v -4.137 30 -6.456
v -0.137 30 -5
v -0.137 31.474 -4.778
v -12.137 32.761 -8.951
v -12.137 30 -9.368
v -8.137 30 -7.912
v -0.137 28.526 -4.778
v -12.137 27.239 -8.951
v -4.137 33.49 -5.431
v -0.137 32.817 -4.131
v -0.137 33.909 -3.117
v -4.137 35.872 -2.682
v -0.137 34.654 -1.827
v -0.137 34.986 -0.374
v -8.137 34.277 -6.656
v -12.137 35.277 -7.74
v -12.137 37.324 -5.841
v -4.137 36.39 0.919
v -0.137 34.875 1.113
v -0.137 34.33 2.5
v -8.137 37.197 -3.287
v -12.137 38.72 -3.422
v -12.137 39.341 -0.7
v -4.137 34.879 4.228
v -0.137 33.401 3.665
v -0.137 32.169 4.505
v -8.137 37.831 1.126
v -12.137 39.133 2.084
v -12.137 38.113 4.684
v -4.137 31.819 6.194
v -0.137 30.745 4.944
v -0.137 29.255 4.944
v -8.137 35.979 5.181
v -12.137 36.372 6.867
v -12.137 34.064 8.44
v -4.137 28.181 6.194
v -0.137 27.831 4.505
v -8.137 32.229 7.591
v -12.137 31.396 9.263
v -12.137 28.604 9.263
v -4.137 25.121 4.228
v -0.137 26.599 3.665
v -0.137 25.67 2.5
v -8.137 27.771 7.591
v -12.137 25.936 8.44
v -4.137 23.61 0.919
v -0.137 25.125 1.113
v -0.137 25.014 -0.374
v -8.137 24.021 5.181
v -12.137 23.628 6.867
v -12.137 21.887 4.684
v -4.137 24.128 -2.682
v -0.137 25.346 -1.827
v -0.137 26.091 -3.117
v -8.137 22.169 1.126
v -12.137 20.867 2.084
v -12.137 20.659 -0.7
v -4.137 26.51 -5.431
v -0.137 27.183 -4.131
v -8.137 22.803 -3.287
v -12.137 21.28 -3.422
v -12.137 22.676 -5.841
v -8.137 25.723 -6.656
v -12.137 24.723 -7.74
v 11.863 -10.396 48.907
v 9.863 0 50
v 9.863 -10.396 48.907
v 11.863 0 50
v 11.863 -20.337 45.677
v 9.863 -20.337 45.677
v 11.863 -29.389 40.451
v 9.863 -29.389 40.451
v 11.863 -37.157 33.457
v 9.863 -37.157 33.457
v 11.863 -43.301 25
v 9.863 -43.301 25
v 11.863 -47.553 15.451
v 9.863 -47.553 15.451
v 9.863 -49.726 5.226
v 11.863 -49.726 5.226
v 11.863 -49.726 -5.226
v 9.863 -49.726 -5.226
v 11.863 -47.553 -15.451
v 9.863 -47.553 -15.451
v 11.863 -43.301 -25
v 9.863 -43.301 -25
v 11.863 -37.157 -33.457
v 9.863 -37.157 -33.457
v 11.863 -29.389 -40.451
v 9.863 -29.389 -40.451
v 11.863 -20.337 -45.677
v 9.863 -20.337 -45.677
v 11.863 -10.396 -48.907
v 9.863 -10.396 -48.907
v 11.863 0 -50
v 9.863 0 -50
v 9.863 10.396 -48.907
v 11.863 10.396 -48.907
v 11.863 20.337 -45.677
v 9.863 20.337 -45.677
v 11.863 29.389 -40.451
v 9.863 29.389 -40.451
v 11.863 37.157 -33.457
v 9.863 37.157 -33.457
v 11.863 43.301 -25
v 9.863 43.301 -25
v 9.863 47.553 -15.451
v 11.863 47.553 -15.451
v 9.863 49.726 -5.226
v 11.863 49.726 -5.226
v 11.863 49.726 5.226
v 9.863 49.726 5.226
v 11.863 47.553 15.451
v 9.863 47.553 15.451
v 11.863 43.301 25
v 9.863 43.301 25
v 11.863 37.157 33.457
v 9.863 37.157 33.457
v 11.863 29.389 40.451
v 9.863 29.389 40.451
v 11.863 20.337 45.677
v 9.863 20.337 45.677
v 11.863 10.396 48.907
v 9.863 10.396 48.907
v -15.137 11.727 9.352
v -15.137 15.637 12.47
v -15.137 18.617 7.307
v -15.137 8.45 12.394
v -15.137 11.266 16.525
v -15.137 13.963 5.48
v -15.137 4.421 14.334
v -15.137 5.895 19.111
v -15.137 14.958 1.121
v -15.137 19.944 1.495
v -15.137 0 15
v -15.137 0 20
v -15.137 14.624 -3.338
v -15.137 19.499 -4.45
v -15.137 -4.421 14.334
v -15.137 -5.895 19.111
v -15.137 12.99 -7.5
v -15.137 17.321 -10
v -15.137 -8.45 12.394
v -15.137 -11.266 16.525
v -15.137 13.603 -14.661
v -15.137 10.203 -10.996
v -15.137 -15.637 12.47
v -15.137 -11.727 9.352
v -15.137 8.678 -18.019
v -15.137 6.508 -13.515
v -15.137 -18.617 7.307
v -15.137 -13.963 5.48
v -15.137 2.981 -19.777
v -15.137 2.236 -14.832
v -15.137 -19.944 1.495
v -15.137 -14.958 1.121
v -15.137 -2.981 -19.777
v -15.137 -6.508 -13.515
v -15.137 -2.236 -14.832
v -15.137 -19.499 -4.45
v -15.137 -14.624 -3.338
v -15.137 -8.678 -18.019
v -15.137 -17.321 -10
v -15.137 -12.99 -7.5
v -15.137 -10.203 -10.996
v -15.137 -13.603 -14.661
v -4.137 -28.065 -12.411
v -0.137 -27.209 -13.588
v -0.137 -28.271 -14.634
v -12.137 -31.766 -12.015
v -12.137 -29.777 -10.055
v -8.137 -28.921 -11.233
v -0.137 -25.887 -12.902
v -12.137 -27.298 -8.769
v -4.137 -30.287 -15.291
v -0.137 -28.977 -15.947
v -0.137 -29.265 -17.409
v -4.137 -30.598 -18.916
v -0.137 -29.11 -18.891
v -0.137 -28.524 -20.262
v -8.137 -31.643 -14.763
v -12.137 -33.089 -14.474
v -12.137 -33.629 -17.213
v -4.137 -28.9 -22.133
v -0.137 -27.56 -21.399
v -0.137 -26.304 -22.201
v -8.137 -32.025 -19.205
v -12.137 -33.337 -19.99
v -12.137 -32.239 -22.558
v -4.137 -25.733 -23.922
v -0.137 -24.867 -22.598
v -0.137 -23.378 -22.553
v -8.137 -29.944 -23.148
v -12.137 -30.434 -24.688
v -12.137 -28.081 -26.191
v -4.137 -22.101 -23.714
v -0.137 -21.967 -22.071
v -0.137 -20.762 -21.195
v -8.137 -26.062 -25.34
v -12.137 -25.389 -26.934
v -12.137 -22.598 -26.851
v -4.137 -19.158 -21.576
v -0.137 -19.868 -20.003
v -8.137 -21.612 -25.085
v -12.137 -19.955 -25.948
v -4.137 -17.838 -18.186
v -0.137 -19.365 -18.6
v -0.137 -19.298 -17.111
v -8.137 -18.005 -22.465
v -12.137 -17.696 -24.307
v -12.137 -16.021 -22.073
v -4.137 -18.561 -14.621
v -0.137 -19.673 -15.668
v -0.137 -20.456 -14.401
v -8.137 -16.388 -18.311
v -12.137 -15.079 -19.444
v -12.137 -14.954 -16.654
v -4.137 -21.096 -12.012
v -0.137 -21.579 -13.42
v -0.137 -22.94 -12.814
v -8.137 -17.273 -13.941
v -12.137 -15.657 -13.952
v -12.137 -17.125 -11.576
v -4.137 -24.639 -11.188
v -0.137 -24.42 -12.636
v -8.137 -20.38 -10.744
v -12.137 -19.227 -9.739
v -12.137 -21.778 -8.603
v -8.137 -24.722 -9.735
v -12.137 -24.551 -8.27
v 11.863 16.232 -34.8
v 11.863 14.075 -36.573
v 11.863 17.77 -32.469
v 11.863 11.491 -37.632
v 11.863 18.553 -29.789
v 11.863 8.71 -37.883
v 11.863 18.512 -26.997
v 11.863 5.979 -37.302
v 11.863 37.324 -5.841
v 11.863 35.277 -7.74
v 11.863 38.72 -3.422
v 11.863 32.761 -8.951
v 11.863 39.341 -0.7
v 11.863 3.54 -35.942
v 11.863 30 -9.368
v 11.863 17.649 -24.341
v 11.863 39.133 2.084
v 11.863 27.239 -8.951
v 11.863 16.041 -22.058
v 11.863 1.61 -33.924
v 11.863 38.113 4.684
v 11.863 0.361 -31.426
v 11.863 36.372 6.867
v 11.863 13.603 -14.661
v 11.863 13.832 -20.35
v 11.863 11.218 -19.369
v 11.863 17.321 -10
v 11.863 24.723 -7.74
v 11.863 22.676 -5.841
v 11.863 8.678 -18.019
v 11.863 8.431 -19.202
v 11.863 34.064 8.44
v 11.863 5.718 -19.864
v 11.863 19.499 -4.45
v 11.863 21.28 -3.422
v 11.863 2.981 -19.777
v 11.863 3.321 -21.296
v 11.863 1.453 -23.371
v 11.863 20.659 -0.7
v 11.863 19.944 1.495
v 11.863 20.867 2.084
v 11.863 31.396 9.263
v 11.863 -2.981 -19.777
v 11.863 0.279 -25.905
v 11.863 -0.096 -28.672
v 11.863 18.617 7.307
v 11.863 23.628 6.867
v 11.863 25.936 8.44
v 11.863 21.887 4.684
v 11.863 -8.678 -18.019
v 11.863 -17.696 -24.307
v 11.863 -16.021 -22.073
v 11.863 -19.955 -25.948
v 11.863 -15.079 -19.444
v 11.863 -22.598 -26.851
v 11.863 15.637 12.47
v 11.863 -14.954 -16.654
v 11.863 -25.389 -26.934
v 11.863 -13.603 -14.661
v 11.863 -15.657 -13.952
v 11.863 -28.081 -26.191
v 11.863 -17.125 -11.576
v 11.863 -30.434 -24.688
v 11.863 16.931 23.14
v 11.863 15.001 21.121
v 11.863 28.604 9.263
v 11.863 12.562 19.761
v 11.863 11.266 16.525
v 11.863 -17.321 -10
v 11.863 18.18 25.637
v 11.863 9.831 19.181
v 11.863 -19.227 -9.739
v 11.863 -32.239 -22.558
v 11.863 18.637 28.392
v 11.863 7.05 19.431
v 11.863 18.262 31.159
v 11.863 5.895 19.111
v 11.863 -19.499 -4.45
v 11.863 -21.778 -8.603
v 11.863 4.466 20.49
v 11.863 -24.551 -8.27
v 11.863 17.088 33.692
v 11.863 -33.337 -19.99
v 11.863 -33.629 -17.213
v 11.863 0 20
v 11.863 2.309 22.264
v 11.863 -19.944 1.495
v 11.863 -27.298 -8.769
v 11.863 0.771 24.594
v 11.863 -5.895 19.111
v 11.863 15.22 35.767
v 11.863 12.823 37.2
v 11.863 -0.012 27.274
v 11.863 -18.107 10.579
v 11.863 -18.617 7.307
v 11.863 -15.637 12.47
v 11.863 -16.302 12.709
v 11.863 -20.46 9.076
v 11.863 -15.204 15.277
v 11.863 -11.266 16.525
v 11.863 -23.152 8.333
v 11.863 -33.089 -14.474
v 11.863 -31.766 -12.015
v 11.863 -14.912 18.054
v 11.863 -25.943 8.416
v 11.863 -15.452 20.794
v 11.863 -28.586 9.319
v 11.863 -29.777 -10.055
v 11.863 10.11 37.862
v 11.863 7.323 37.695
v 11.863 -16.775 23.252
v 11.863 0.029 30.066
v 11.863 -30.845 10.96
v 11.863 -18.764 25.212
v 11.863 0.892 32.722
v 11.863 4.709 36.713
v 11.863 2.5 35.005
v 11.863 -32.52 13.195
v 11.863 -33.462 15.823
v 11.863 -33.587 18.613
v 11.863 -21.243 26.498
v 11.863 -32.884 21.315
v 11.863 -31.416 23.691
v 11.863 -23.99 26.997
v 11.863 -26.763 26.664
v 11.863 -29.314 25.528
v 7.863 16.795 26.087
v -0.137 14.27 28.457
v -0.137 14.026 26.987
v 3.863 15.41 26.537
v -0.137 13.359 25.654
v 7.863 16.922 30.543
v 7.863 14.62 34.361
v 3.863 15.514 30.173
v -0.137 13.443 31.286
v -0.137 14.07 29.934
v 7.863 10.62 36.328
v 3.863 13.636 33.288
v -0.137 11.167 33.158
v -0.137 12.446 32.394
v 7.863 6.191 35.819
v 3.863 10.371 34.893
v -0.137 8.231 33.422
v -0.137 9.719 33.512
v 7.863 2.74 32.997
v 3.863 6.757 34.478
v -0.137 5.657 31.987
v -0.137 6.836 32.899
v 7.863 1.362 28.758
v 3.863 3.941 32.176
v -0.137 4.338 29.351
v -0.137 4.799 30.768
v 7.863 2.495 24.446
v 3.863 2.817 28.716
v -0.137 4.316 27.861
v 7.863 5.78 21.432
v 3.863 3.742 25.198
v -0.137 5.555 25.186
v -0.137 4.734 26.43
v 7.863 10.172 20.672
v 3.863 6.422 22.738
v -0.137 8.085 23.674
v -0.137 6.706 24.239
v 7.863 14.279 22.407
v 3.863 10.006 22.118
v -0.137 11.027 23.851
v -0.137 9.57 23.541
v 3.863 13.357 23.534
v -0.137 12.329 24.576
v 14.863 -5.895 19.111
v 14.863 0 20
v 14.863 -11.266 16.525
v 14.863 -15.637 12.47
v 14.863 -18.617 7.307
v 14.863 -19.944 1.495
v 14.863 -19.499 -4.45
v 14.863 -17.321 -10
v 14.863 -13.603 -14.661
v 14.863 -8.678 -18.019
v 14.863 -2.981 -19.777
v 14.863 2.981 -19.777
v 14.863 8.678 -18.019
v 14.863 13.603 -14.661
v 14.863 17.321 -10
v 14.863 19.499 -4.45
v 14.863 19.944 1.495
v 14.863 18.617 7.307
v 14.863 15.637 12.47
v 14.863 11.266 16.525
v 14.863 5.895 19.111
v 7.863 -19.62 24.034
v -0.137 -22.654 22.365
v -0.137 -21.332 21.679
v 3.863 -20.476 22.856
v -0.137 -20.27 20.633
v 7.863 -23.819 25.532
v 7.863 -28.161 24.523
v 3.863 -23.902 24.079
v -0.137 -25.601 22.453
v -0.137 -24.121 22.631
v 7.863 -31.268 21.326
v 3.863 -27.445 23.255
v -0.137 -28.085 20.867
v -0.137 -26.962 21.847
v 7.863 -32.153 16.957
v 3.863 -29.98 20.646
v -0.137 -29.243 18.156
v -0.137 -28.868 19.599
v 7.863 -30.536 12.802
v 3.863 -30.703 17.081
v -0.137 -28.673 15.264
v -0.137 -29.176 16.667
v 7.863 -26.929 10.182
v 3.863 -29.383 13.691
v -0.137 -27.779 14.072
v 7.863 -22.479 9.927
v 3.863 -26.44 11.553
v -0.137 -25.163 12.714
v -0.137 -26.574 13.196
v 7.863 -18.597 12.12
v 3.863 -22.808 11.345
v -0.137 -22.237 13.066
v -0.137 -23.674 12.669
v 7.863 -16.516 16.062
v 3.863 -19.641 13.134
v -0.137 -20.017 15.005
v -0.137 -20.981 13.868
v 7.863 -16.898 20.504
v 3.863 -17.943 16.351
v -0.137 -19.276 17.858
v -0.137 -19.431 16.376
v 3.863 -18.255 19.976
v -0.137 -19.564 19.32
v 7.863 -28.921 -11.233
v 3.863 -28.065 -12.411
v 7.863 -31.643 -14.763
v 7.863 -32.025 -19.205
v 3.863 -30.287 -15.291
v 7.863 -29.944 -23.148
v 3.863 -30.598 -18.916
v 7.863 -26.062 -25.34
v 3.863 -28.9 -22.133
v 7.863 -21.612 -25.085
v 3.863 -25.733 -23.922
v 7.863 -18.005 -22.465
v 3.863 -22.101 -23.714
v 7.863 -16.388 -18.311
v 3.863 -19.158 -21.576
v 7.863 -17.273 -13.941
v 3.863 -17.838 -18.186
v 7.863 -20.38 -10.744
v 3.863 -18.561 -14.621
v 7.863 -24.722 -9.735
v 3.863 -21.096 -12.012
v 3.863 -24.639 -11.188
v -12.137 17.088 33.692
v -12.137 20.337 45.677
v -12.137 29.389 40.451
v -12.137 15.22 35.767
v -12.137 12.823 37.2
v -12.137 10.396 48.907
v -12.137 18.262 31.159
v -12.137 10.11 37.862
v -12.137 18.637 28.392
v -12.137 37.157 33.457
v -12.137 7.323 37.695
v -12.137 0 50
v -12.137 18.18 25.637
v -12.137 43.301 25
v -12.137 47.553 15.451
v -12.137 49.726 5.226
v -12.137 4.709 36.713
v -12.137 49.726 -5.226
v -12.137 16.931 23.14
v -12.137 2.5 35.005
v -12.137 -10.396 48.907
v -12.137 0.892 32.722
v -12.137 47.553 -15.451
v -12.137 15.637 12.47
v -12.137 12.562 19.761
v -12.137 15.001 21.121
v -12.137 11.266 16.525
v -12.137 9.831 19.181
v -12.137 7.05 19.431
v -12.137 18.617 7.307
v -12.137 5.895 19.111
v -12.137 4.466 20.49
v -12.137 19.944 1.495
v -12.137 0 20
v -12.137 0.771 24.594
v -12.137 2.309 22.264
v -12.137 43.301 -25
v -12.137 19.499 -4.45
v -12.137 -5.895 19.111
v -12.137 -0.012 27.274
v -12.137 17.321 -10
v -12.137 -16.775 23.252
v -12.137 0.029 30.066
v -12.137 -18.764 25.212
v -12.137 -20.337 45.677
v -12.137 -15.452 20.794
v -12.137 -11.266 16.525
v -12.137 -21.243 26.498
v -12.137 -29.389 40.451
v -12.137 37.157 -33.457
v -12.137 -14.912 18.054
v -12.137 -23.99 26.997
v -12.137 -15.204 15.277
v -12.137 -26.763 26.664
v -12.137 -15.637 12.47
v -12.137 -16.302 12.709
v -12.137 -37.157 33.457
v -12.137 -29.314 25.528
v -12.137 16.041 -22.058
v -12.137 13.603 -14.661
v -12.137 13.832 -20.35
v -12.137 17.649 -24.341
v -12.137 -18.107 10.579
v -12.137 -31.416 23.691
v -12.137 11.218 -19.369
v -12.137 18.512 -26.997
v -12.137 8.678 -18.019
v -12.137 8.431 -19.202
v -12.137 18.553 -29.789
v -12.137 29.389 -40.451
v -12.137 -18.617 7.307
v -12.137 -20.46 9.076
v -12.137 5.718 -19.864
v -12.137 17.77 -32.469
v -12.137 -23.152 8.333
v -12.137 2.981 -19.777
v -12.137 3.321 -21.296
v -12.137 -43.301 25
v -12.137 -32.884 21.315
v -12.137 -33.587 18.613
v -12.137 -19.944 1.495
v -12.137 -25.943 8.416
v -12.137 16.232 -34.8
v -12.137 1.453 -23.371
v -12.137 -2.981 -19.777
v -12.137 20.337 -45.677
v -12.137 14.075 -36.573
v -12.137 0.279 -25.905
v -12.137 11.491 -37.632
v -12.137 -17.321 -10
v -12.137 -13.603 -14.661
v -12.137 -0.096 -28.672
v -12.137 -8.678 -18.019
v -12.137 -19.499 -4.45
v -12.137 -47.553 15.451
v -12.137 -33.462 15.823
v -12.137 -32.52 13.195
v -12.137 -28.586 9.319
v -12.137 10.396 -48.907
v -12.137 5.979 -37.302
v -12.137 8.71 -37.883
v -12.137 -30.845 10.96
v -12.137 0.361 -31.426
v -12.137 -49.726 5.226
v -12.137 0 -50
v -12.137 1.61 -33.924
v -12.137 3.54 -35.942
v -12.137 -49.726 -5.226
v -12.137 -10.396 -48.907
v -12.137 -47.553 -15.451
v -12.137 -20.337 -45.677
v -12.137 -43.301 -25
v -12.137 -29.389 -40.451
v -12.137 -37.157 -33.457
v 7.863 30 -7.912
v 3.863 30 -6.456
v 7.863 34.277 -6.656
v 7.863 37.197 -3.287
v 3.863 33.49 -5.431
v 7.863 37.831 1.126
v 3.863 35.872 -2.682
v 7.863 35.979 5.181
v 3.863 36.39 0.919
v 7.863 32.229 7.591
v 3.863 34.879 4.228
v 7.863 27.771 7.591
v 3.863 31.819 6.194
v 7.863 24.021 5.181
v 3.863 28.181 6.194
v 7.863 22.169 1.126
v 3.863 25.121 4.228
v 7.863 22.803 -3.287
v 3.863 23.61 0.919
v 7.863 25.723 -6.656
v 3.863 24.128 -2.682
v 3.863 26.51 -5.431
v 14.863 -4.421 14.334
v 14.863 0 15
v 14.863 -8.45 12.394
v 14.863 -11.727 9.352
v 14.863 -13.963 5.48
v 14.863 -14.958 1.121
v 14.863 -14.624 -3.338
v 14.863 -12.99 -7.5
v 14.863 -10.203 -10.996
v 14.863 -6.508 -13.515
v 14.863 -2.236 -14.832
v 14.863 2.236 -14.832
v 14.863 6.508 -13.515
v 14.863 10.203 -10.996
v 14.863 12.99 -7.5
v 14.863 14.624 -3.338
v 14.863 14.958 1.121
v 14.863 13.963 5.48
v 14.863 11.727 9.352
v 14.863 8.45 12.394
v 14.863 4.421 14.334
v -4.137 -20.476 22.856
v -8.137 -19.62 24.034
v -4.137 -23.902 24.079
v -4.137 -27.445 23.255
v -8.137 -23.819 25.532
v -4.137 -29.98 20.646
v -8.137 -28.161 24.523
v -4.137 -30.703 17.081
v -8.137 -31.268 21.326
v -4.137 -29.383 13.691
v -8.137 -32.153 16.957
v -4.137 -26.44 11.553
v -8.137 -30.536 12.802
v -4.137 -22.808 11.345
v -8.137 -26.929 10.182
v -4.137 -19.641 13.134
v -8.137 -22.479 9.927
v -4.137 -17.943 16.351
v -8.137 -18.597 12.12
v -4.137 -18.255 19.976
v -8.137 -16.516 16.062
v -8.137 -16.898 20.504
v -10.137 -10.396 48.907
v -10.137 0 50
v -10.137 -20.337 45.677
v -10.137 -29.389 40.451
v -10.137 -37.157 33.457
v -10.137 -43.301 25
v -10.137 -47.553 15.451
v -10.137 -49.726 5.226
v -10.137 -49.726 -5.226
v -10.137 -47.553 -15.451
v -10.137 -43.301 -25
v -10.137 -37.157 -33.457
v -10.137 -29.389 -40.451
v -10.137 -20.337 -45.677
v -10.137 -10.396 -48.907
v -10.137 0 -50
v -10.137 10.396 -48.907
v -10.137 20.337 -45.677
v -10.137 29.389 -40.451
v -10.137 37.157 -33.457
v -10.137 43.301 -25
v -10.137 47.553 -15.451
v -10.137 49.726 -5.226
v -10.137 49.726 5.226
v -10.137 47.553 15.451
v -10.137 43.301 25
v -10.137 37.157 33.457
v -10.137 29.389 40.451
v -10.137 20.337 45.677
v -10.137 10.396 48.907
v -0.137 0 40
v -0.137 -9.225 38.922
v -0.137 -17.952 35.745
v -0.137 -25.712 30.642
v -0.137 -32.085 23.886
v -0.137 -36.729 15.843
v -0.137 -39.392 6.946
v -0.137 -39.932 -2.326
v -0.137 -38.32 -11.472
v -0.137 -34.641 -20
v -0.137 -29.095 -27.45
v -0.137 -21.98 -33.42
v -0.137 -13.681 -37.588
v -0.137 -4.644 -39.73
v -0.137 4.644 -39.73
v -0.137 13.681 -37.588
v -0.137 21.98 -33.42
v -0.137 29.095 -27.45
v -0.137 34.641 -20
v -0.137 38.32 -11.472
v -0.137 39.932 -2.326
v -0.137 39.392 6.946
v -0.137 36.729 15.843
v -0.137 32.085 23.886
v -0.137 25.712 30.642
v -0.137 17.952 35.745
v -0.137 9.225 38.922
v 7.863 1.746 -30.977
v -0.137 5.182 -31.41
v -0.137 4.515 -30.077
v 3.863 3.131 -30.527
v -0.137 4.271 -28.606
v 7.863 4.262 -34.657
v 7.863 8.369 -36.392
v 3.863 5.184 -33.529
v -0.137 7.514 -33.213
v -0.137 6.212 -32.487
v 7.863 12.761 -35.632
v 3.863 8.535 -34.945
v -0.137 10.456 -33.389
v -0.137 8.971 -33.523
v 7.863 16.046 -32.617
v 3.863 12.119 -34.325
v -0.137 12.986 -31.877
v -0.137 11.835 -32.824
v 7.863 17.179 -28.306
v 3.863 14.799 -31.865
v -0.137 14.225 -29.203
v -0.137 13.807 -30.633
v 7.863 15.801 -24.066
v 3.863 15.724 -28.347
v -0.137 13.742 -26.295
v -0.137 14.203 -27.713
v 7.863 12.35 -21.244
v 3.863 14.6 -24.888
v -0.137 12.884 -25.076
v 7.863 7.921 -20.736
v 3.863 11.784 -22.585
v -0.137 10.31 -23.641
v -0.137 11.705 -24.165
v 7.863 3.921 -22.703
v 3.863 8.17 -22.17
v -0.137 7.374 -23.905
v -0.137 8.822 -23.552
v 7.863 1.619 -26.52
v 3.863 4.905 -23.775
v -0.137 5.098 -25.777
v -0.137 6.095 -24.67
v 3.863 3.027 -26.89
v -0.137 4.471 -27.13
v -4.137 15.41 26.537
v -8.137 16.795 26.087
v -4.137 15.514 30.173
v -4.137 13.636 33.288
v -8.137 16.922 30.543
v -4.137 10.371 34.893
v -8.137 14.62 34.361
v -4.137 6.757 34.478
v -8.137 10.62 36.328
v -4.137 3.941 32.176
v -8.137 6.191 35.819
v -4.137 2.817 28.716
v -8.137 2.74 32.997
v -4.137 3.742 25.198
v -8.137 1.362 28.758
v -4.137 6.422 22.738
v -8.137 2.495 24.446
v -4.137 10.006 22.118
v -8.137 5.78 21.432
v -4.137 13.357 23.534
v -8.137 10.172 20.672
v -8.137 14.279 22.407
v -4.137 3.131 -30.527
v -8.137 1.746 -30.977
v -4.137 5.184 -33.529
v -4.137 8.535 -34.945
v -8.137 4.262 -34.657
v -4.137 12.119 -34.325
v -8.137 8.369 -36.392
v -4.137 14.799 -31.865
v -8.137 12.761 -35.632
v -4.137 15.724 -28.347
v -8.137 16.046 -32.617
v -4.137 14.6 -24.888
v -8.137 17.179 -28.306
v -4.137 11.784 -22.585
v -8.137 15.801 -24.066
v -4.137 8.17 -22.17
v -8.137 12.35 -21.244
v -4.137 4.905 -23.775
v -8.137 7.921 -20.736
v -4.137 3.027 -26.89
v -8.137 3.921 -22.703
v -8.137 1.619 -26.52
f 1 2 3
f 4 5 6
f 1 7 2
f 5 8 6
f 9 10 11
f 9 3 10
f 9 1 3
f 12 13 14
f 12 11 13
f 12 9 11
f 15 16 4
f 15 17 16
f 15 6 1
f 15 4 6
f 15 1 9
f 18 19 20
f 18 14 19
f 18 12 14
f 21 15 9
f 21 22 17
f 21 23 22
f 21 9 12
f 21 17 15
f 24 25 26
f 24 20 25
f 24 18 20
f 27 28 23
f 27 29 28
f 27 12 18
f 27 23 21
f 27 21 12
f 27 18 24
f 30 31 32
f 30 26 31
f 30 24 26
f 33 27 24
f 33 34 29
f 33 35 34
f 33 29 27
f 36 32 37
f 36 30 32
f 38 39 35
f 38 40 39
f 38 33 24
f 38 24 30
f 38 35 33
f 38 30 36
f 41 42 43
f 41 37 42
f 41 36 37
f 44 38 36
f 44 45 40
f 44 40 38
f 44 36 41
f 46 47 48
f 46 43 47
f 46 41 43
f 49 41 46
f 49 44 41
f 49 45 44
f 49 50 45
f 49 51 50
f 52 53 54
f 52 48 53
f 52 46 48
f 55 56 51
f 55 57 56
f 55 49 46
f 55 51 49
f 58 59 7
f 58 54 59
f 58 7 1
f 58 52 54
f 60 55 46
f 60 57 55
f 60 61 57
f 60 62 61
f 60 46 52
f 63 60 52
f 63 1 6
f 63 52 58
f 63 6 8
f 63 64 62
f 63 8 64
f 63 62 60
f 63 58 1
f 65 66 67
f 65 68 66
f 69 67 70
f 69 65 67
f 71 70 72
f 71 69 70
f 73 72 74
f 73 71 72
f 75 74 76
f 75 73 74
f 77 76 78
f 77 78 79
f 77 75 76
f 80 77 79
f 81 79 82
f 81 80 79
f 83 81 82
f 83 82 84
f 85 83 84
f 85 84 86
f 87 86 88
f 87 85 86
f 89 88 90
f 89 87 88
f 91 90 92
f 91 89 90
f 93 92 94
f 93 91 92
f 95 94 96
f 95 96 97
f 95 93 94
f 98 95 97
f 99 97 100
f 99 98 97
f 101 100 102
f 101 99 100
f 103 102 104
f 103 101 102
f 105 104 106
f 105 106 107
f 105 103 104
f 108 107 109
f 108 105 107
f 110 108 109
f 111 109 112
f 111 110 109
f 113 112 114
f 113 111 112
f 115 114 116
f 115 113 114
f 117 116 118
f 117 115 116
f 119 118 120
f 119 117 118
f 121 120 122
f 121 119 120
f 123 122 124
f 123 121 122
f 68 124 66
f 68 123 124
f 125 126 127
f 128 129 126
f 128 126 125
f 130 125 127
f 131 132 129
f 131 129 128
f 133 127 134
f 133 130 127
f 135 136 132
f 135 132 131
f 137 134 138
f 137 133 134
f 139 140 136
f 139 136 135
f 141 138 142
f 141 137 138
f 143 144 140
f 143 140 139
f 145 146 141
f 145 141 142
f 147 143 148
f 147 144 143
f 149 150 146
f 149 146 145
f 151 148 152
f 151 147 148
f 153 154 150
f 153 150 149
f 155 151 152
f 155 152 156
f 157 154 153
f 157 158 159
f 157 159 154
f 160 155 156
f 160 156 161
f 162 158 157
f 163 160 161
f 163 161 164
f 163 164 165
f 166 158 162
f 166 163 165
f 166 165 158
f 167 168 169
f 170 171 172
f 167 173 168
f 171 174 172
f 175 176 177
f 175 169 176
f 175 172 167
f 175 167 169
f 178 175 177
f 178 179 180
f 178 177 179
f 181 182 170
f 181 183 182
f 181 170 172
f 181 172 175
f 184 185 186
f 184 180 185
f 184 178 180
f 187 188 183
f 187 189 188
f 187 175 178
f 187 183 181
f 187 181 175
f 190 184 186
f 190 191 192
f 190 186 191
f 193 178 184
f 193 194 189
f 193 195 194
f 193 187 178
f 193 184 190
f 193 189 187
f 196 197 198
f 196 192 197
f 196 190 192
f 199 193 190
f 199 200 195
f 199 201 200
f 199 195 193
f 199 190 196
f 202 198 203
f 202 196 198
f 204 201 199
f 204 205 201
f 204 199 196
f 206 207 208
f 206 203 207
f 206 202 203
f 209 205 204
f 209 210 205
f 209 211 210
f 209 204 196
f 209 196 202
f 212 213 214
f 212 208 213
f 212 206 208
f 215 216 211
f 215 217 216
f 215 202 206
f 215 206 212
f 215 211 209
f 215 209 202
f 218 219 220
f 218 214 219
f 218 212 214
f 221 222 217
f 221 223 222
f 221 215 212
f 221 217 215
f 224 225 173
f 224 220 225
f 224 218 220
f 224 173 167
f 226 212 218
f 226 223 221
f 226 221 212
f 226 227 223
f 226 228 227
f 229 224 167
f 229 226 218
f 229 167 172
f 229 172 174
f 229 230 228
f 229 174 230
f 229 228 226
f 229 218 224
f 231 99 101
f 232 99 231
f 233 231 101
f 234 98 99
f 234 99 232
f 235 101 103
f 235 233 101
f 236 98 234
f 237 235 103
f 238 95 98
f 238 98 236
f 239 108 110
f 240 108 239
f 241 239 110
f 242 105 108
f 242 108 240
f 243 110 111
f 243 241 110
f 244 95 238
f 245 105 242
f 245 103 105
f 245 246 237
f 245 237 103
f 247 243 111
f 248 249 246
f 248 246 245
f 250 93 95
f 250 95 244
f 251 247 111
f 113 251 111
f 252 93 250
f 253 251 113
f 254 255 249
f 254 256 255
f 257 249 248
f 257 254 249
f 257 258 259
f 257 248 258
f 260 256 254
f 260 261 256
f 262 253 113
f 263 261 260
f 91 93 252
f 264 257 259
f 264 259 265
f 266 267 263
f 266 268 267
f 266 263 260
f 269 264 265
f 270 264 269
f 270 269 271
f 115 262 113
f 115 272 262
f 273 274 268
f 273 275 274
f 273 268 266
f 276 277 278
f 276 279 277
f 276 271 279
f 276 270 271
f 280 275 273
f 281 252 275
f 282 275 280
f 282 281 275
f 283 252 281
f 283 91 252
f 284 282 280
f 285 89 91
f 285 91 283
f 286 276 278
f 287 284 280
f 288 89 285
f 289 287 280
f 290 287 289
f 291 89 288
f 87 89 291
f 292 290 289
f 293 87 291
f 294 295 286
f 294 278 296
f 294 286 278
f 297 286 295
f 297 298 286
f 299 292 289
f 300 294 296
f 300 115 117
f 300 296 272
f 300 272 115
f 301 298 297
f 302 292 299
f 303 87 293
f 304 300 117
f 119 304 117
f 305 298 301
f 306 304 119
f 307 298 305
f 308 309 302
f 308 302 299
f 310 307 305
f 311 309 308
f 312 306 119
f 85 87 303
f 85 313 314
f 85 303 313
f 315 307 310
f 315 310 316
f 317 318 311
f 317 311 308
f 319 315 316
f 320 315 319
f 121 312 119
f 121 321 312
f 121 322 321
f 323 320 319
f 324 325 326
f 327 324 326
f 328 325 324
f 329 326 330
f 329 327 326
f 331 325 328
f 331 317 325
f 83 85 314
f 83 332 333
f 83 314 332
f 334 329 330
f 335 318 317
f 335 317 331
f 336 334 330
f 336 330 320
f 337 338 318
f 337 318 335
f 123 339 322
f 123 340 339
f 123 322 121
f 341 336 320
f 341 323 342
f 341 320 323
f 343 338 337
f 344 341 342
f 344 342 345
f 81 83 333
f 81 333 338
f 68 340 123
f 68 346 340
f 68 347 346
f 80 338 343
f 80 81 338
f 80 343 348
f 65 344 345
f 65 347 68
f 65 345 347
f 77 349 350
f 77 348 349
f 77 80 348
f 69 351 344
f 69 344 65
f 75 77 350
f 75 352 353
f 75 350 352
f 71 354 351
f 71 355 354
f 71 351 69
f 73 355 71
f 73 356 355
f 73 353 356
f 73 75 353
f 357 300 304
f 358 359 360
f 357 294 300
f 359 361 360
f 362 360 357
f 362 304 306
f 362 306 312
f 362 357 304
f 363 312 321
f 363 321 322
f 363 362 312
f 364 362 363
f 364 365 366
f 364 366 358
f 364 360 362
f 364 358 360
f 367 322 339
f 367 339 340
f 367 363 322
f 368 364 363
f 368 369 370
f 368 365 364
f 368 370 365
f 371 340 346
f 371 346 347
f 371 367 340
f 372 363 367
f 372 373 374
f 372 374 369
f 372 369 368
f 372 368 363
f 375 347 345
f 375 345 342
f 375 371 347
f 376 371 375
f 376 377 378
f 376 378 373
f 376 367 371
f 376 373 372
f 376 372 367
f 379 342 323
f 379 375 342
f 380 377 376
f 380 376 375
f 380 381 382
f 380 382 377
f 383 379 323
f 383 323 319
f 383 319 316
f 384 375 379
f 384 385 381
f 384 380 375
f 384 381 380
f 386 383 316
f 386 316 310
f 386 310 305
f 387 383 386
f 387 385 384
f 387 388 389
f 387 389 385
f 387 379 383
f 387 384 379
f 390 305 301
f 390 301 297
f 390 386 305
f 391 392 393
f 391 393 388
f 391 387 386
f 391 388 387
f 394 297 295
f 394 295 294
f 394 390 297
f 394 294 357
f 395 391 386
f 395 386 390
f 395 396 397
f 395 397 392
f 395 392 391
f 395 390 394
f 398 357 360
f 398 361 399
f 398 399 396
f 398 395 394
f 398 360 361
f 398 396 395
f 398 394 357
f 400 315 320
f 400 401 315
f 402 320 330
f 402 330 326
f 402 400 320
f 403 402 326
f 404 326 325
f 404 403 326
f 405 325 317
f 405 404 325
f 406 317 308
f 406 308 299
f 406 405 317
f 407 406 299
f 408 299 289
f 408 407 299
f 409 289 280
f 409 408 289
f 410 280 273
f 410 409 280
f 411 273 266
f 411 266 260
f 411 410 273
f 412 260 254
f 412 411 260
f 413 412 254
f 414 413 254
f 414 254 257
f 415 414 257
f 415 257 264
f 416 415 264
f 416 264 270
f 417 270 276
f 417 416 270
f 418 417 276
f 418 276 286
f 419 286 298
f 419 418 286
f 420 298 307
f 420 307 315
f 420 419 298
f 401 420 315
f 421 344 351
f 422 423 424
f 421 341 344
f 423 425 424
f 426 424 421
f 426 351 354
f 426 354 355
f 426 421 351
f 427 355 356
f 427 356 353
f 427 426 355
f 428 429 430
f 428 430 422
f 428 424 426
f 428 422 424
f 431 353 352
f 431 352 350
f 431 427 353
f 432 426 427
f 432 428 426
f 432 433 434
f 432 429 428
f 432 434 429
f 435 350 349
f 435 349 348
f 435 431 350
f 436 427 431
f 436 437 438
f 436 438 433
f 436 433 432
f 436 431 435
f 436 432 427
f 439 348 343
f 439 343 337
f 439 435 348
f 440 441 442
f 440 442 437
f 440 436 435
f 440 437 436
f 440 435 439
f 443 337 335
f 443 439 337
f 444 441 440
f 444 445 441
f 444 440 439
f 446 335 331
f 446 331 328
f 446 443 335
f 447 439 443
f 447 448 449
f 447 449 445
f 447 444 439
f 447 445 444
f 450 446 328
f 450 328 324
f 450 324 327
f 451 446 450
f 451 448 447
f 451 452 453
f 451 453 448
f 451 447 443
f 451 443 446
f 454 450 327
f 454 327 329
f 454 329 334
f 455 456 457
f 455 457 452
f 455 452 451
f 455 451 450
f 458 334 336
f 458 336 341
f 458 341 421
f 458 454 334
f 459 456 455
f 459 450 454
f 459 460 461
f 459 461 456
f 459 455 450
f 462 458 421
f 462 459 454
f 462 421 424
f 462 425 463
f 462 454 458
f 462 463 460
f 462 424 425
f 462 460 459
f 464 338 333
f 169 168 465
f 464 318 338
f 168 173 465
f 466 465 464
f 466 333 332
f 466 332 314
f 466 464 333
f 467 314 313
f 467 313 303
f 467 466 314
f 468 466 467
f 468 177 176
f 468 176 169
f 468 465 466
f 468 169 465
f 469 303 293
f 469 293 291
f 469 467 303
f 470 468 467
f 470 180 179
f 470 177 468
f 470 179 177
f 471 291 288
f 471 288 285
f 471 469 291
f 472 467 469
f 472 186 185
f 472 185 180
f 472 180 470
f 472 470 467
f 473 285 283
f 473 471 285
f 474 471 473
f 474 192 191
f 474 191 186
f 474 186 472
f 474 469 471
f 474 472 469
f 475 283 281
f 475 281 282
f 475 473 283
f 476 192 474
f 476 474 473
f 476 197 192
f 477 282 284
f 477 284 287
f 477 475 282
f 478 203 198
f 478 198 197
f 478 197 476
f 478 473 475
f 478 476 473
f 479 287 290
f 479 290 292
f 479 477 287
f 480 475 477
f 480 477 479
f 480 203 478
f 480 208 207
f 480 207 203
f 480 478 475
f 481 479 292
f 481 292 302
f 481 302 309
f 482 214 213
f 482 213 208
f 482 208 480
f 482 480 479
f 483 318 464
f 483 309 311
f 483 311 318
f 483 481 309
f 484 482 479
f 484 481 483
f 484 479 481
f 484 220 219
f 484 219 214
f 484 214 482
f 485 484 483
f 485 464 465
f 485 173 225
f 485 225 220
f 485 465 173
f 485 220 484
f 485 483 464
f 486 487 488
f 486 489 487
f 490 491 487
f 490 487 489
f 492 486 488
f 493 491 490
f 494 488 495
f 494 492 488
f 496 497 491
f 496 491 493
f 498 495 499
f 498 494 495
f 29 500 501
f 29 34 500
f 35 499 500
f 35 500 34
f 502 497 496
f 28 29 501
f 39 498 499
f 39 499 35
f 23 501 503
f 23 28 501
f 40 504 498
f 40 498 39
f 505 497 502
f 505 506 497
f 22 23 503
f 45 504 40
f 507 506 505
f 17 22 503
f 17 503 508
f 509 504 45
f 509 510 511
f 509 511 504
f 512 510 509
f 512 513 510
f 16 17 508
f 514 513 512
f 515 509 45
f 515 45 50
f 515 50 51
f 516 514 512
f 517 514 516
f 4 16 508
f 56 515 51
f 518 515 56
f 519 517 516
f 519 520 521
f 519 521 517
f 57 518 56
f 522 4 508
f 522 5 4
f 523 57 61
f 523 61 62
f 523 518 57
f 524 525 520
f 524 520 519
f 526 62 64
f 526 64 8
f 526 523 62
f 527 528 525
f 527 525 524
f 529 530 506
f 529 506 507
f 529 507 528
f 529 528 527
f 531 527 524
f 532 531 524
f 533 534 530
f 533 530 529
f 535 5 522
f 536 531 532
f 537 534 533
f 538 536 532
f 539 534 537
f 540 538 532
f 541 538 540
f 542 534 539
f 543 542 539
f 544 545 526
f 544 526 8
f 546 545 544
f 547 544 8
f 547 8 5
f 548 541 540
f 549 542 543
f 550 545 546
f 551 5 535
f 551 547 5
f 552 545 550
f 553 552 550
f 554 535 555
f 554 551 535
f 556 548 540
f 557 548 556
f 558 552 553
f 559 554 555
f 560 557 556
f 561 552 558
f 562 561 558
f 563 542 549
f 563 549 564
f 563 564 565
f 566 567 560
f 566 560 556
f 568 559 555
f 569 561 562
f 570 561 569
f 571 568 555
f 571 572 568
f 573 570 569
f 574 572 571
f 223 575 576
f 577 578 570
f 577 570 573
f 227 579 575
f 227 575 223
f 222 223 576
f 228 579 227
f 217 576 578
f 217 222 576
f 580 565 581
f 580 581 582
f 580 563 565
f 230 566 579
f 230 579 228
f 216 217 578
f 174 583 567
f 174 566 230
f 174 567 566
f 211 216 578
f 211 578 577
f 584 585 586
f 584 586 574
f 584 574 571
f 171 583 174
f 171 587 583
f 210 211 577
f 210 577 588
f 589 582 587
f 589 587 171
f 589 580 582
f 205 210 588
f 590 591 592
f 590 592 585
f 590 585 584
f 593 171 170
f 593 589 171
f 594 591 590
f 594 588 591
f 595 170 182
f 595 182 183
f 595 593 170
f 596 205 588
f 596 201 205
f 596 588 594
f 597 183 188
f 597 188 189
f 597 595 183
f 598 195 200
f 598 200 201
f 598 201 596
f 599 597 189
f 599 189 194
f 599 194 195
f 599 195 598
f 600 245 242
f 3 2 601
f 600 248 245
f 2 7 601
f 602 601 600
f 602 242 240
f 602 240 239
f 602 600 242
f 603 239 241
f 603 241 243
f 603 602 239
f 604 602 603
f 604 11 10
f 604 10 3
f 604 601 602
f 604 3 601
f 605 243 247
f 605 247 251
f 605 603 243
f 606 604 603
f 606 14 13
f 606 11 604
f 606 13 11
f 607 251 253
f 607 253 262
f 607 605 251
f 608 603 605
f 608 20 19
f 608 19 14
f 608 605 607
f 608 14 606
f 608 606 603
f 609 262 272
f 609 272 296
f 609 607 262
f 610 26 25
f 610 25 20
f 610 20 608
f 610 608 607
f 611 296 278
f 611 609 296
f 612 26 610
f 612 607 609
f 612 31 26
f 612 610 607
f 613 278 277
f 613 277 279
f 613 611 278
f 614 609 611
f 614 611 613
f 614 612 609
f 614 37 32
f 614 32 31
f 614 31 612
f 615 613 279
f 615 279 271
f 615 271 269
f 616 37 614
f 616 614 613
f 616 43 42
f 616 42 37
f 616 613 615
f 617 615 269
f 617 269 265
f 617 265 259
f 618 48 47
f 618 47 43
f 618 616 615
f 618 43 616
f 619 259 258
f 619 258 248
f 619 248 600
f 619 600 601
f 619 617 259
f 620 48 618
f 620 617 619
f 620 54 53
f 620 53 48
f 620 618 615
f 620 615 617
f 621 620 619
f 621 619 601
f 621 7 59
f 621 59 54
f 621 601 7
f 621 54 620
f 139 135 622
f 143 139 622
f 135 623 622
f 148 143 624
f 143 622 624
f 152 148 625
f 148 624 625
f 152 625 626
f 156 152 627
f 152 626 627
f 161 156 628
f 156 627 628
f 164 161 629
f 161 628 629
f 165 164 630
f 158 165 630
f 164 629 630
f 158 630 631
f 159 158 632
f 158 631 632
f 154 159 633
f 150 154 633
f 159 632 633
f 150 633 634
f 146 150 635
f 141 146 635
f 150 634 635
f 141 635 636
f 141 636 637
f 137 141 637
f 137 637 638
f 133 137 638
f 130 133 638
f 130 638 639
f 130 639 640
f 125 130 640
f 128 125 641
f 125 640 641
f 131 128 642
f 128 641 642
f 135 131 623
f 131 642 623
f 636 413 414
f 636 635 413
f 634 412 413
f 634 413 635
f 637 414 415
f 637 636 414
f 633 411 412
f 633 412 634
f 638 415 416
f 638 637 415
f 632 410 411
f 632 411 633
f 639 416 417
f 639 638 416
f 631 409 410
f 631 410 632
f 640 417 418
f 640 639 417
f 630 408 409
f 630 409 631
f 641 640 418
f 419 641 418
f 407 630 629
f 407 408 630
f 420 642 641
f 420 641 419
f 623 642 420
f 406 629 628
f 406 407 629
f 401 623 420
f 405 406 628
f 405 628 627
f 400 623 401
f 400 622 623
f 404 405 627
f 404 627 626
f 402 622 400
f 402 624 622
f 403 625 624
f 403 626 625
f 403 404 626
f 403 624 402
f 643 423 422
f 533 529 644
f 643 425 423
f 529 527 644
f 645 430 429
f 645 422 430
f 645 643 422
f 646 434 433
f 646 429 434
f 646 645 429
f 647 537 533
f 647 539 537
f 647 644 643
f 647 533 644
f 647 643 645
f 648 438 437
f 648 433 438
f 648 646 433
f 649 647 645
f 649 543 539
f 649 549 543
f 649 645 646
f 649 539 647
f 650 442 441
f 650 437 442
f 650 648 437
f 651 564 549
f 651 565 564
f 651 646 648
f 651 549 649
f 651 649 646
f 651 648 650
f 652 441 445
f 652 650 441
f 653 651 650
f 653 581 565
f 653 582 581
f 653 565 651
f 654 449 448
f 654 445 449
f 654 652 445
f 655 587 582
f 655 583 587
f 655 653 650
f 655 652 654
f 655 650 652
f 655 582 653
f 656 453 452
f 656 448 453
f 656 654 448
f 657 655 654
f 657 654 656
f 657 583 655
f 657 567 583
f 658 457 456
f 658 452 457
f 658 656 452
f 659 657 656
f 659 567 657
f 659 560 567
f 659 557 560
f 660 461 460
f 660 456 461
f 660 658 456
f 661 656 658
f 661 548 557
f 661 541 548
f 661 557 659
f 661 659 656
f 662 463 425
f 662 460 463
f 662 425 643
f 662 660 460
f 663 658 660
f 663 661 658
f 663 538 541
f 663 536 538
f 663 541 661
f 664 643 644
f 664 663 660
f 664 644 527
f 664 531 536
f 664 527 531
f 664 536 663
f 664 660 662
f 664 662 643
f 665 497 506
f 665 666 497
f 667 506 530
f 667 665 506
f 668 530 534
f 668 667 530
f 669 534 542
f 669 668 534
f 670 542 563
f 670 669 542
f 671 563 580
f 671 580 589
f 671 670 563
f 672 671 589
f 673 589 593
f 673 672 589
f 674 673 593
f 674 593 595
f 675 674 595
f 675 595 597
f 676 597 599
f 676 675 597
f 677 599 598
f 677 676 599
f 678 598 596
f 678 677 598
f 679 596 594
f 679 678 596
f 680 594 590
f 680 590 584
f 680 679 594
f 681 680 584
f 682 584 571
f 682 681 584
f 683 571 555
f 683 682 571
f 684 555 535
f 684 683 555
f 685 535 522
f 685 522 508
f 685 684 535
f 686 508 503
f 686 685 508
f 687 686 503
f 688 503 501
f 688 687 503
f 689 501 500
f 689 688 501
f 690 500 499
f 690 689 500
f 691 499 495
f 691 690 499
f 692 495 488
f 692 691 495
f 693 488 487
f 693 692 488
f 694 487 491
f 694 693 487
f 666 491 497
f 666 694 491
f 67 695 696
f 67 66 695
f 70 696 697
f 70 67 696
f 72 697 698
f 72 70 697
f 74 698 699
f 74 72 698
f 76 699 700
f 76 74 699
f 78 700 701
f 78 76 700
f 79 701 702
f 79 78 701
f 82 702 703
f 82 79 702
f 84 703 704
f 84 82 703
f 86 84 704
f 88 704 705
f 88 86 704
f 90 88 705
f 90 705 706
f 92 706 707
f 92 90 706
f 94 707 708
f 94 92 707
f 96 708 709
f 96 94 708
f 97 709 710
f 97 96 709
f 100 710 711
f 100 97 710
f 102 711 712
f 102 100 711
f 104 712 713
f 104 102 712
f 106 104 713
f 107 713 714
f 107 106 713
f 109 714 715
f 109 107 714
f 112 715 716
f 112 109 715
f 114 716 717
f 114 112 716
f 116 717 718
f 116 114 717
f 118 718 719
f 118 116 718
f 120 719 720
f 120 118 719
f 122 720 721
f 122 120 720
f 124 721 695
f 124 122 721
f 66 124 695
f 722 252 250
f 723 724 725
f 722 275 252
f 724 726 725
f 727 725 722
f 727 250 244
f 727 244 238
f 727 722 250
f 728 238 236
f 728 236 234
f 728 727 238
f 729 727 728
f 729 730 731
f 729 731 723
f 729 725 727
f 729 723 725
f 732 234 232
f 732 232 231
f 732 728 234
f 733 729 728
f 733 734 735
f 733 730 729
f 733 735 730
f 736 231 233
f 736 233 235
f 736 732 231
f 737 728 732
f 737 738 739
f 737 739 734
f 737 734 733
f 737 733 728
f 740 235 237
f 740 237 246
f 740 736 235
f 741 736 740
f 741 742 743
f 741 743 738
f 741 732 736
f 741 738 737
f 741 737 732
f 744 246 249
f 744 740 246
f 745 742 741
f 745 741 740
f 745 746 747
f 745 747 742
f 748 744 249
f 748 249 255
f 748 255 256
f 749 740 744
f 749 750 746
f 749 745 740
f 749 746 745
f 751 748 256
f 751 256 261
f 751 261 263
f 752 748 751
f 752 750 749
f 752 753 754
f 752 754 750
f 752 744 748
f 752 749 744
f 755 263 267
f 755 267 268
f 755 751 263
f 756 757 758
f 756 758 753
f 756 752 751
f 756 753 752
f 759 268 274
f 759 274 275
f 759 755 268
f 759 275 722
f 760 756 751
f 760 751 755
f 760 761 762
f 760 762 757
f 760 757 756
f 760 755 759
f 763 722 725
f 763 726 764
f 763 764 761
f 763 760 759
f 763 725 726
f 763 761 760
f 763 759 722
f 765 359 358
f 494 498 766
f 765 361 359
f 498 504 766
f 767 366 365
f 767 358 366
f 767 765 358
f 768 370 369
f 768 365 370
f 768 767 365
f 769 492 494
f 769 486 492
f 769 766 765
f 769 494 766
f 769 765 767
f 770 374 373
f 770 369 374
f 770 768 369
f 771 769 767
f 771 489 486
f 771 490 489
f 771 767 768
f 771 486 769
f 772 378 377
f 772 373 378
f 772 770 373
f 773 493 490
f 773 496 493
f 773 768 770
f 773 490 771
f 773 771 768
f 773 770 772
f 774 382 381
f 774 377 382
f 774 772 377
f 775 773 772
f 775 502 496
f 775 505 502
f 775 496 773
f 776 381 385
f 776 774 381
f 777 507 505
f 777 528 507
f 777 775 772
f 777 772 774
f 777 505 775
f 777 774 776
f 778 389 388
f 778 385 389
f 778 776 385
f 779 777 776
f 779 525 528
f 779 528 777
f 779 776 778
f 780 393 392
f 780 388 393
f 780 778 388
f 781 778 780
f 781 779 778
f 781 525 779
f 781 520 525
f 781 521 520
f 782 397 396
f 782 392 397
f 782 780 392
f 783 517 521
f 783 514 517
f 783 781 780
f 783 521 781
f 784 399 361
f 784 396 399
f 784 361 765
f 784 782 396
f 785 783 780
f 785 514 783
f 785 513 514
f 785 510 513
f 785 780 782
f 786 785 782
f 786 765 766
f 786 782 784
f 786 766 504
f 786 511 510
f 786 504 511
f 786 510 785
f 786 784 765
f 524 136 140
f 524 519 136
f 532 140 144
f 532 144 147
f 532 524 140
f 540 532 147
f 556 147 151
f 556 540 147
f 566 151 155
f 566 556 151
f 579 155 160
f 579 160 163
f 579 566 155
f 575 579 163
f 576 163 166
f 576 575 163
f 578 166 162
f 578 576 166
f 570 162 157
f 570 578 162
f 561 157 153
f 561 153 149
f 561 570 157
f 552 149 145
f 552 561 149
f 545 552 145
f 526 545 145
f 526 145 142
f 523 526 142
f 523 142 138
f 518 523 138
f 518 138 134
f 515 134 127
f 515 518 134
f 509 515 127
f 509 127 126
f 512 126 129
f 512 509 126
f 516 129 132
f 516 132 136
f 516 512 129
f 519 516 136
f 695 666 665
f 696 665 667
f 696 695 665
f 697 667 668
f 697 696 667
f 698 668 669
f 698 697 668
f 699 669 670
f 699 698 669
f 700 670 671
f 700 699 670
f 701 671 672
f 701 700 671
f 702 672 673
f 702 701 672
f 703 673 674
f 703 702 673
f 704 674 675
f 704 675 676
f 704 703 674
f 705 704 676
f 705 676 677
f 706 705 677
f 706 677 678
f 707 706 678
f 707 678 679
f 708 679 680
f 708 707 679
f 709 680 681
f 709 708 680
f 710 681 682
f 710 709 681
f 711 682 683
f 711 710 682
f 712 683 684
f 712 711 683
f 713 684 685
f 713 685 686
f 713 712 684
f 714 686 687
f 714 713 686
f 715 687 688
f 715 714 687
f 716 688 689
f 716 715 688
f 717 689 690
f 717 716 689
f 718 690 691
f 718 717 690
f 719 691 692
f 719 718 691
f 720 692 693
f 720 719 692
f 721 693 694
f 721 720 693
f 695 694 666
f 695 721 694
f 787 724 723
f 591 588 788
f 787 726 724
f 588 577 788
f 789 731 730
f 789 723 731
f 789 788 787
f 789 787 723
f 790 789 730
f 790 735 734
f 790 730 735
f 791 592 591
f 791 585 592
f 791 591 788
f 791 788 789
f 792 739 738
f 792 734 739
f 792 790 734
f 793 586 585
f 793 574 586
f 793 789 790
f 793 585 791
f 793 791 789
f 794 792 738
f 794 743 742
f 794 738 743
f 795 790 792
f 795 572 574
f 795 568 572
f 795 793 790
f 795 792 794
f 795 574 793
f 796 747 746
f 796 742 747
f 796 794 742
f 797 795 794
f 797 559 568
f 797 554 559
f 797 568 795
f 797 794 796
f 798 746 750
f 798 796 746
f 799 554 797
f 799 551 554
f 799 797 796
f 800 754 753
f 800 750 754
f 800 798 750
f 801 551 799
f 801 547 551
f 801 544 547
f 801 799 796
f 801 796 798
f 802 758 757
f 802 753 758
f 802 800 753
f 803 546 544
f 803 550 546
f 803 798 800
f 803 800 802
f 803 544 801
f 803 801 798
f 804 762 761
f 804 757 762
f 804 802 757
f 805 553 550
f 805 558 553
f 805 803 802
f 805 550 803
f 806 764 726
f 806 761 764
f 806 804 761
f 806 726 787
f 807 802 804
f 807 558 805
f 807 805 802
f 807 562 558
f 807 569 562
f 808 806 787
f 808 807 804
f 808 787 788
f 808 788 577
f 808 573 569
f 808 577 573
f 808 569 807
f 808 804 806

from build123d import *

# Parameters (mm, degrees)
IZIM2_R                           = 5
KES_EKSTR_ZYON3_DEPTH             = 12
KES_EKSTR_ZYON3_TAPER             = -20
KES_EKSTR_ZYON3_OTHER_WAY_DEPTH   = 12
KES_EKSTR_ZYON3_OTHER_WAY_DRAFT   = -20
DAIRESEL_KAPLAMA1_COUNT           = 5
DAIRESEL_KAPLAMA1_COPY_1_SKETCH_R = 5
DAIRESEL_KAPLAMA1_COPY_1_DEPTH    = 12
DAIRESEL_KAPLAMA1_COPY_1_DRAFT    = -20
DAIRESEL_KAPLAMA1_COPY_2_SKETCH_R = 5
DAIRESEL_KAPLAMA1_COPY_2_DEPTH    = 12
DAIRESEL_KAPLAMA1_COPY_2_DRAFT    = -20
DAIRESEL_KAPLAMA1_COPY_3_SKETCH_R = 5
DAIRESEL_KAPLAMA1_COPY_3_DEPTH    = 12
DAIRESEL_KAPLAMA1_COPY_3_DRAFT    = -20
DAIRESEL_KAPLAMA1_COPY_4_SKETCH_R = 5
DAIRESEL_KAPLAMA1_COPY_4_DEPTH    = 12
DAIRESEL_KAPLAMA1_COPY_4_DRAFT    = -20
DAIRESEL_KAPLAMA1_COPY_5_SKETCH_R = 5
DAIRESEL_KAPLAMA1_COPY_5_DEPTH    = 12
DAIRESEL_KAPLAMA1_COPY_5_DRAFT    = -20
DAIRESEL_KAPLAMA1_COPY_6_SKETCH_R = 5
DAIRESEL_KAPLAMA1_COPY_6_DEPTH    = 12
DAIRESEL_KAPLAMA1_COPY_6_DRAFT    = -20
DAIRESEL_KAPLAMA1_COPY_7_SKETCH_R = 5
DAIRESEL_KAPLAMA1_COPY_7_DEPTH    = 12
DAIRESEL_KAPLAMA1_COPY_7_DRAFT    = -20
DAIRESEL_KAPLAMA1_COPY_8_SKETCH_R = 5
DAIRESEL_KAPLAMA1_COPY_8_DEPTH    = 12
DAIRESEL_KAPLAMA1_COPY_8_DRAFT    = -20


with BuildPart() as part:
    # Çizim1 → Döndür1 (revolve)
    with BuildSketch(Plane.XY, mode=Mode.PRIVATE) as d_nd_r1_sk:
        Polygon((-10.136635142, 50), (-0.136635142, 40), (9.863364858, 50), (11.863364858, 50), (11.863364858, 20), (14.863364858, 20), (14.863364858, 15), (11.863364858, 15), (-12.136635142, 15), (-15.136635142, 15), (-15.136635142, 20), (-12.136635142, 20), (-12.136635142, 50), align=None)
    revolve(d_nd_r1_sk.sketch.rotate(Axis((-17.676704828, 0, 0), (1, 0, 0)), 90), axis=Axis((-17.676704828, 0, 0), (1, 0, 0)))

    # Çizim2 → Kes-Ekstrüzyon3 (cut)
    with BuildSketch(Plane(origin=(-0.136635142, 0, 0), x_dir=(0, 0, -1), z_dir=(1, 0, 0))):
        with Locations((0, 30)):
            Circle(IZIM2_R)
    kes_ekstr_zyon3 = extrude(amount=-KES_EKSTR_ZYON3_DEPTH, taper=KES_EKSTR_ZYON3_TAPER, mode=Mode.SUBTRACT)


with BuildPart() as kes_ekstr_zyon3_other_way_tool:
    # Çizim2 → Kes-Ekstrüzyon3 other way (with draft: the straight prism first)
    with BuildSketch(Plane(origin=(-0.136635142, 0, 0), x_dir=(0, 0, -1), z_dir=(1, 0, 0))):
        with Locations((0, 30)):
            Circle(IZIM2_R)
    extrude(amount=KES_EKSTR_ZYON3_OTHER_WAY_DEPTH)
    # Kes-Ekstrüzyon3 other way: the draft: its side faces are tilted about the plane it starts from
    kes_ekstr_zyon3_other_way_sides = [kes_ekstr_zyon3_other_way_tool.faces().sort_by_distance(p)[0] for p in [
        (5.863364858, 30, 5),
    ]]
    draft(kes_ekstr_zyon3_other_way_sides, Plane(origin=(-0.136635142, 0, 0), x_dir=(0, 0, -1), z_dir=(1, 0, 0)), KES_EKSTR_ZYON3_OTHER_WAY_DRAFT)


with BuildPart() as part_1:
    add(part.part)

    # Kes-Ekstrüzyon3 other way: cut by kes_ekstr_zyon3_other_way_tool
    add(kes_ekstr_zyon3_other_way_tool.part, mode=Mode.SUBTRACT)

    # Dairesel Kaplama1: Kes-Ekstrüzyon3 ×5 about axis
    dairesel_kaplama1_axis = Axis((0, 0, 0), (1, 0, 0))
    for i in range(1, DAIRESEL_KAPLAMA1_COUNT):
        add(kes_ekstr_zyon3.rotate(dairesel_kaplama1_axis, i * 360 / DAIRESEL_KAPLAMA1_COUNT), mode=Mode.SUBTRACT)


with BuildPart() as dairesel_kaplama1_copy_1_tool:
    # Dairesel Kaplama1 copy 1 sketch → Dairesel Kaplama1 copy 1 (with draft: the straight prism first)
    with BuildSketch(Plane(origin=(-0.136635142, 0, 0), x_dir=(0, 0.9510565162951535, -0.30901699437494745), z_dir=(1, 0, 0))):
        with Locations((0, 30)):
            Circle(DAIRESEL_KAPLAMA1_COPY_1_SKETCH_R)
    extrude(amount=DAIRESEL_KAPLAMA1_COPY_1_DEPTH)
    # Dairesel Kaplama1 copy 1: the draft: its side faces are tilted about the plane it starts from
    dairesel_kaplama1_copy_1_sides = [dairesel_kaplama1_copy_1_tool.faces().sort_by_distance(p)[0] for p in [
        (5.863364858, 4.51522725, 30.076780461),
    ]]
    draft(dairesel_kaplama1_copy_1_sides, Plane(origin=(-0.136635142, 0, 0), x_dir=(0, 0.9510565162951535, -0.30901699437494745), z_dir=(1, 0, 0)), DAIRESEL_KAPLAMA1_COPY_1_DRAFT)


with BuildPart() as part_2:
    add(part_1.part)

    # Dairesel Kaplama1 copy 1: cut by dairesel_kaplama1_copy_1_tool
    add(dairesel_kaplama1_copy_1_tool.part, mode=Mode.SUBTRACT)


with BuildPart() as dairesel_kaplama1_copy_2_tool:
    # Dairesel Kaplama1 copy 2 sketch → Dairesel Kaplama1 copy 2 (with draft: the straight prism first)
    with BuildSketch(Plane(origin=(-0.136635142, 0, 0), x_dir=(0, 0.5877852522924732, 0.8090169943749473), z_dir=(1, 0, 0))):
        with Locations((0, 30)):
            Circle(DAIRESEL_KAPLAMA1_COPY_2_SKETCH_R)
    extrude(amount=DAIRESEL_KAPLAMA1_COPY_2_DEPTH)
    # Dairesel Kaplama1 copy 2: the draft: its side faces are tilted about the plane it starts from
    dairesel_kaplama1_copy_2_sides = [dairesel_kaplama1_copy_2_tool.faces().sort_by_distance(p)[0] for p in [
        (5.863364858, -27.209436093, 13.588472597),
    ]]
    draft(dairesel_kaplama1_copy_2_sides, Plane(origin=(-0.136635142, 0, 0), x_dir=(0, 0.5877852522924732, 0.8090169943749473), z_dir=(1, 0, 0)), DAIRESEL_KAPLAMA1_COPY_2_DRAFT)


with BuildPart() as part_3:
    add(part_2.part)

    # Dairesel Kaplama1 copy 2: cut by dairesel_kaplama1_copy_2_tool
    add(dairesel_kaplama1_copy_2_tool.part, mode=Mode.SUBTRACT)


with BuildPart() as dairesel_kaplama1_copy_3_tool:
    # Dairesel Kaplama1 copy 3 sketch → Dairesel Kaplama1 copy 3 (with draft: the straight prism first)
    with BuildSketch(Plane(origin=(-0.136635142, 0, 0), x_dir=(0, -0.587785252292473, 0.8090169943749476), z_dir=(1, 0, 0))):
        with Locations((0, 30)):
            Circle(DAIRESEL_KAPLAMA1_COPY_3_SKETCH_R)
    extrude(amount=DAIRESEL_KAPLAMA1_COPY_3_DEPTH)
    # Dairesel Kaplama1 copy 3: the draft: its side faces are tilted about the plane it starts from
    dairesel_kaplama1_copy_3_sides = [dairesel_kaplama1_copy_3_tool.faces().sort_by_distance(p)[0] for p in [
        (5.863364858, -21.33158357, -21.678642541),
    ]]
    draft(dairesel_kaplama1_copy_3_sides, Plane(origin=(-0.136635142, 0, 0), x_dir=(0, -0.587785252292473, 0.8090169943749476), z_dir=(1, 0, 0)), DAIRESEL_KAPLAMA1_COPY_3_DRAFT)


with BuildPart() as part_4:
    add(part_3.part)

    # Dairesel Kaplama1 copy 3: cut by dairesel_kaplama1_copy_3_tool
    add(dairesel_kaplama1_copy_3_tool.part, mode=Mode.SUBTRACT)


with BuildPart() as dairesel_kaplama1_copy_4_tool:
    # Dairesel Kaplama1 copy 4 sketch → Dairesel Kaplama1 copy 4 (with draft: the straight prism first)
    with BuildSketch(Plane(origin=(-0.136635142, 0, 0), x_dir=(0, -0.9510565162951536, -0.30901699437494723), z_dir=(1, 0, 0))):
        with Locations((0, 30)):
            Circle(DAIRESEL_KAPLAMA1_COPY_4_SKETCH_R)
    extrude(amount=DAIRESEL_KAPLAMA1_COPY_4_DEPTH)
    # Dairesel Kaplama1 copy 4: the draft: its side faces are tilted about the plane it starts from
    dairesel_kaplama1_copy_4_sides = [dairesel_kaplama1_copy_4_tool.faces().sort_by_distance(p)[0] for p in [
        (5.863364858, 14.025792413, -26.986610517),
    ]]
    draft(dairesel_kaplama1_copy_4_sides, Plane(origin=(-0.136635142, 0, 0), x_dir=(0, -0.9510565162951536, -0.30901699437494723), z_dir=(1, 0, 0)), DAIRESEL_KAPLAMA1_COPY_4_DRAFT)


with BuildPart() as part_5:
    add(part_4.part)

    # Dairesel Kaplama1 copy 4: cut by dairesel_kaplama1_copy_4_tool
    add(dairesel_kaplama1_copy_4_tool.part, mode=Mode.SUBTRACT)


with BuildPart() as dairesel_kaplama1_copy_5_tool:
    # Dairesel Kaplama1 copy 5 sketch → Dairesel Kaplama1 copy 5 (with draft: the straight prism first)
    with BuildSketch(Plane(origin=(-0.136635142, 0, 0), x_dir=(0, 0.9510565162951535, -0.30901699437494745), z_dir=(1, 0, 0))):
        with Locations((0, 30)):
            Circle(DAIRESEL_KAPLAMA1_COPY_5_SKETCH_R)
    extrude(amount=DAIRESEL_KAPLAMA1_COPY_5_DEPTH)
    # Dairesel Kaplama1 copy 5: the draft: its side faces are tilted about the plane it starts from
    dairesel_kaplama1_copy_5_sides = [dairesel_kaplama1_copy_5_tool.faces().sort_by_distance(p)[0] for p in [
        (5.863364858, 4.51522725, 30.076780461),
    ]]
    draft(dairesel_kaplama1_copy_5_sides, Plane(origin=(-0.136635142, 0, 0), x_dir=(0, 0.9510565162951535, -0.30901699437494745), z_dir=(1, 0, 0)), DAIRESEL_KAPLAMA1_COPY_5_DRAFT)


with BuildPart() as part_6:
    add(part_5.part)

    # Dairesel Kaplama1 copy 5: cut by dairesel_kaplama1_copy_5_tool
    add(dairesel_kaplama1_copy_5_tool.part, mode=Mode.SUBTRACT)


with BuildPart() as dairesel_kaplama1_copy_6_tool:
    # Dairesel Kaplama1 copy 6 sketch → Dairesel Kaplama1 copy 6 (with draft: the straight prism first)
    with BuildSketch(Plane(origin=(-0.136635142, 0, 0), x_dir=(0, 0.5877852522924732, 0.8090169943749473), z_dir=(1, 0, 0))):
        with Locations((0, 30)):
            Circle(DAIRESEL_KAPLAMA1_COPY_6_SKETCH_R)
    extrude(amount=DAIRESEL_KAPLAMA1_COPY_6_DEPTH)
    # Dairesel Kaplama1 copy 6: the draft: its side faces are tilted about the plane it starts from
    dairesel_kaplama1_copy_6_sides = [dairesel_kaplama1_copy_6_tool.faces().sort_by_distance(p)[0] for p in [
        (5.863364858, -27.209436093, 13.588472597),
    ]]
    draft(dairesel_kaplama1_copy_6_sides, Plane(origin=(-0.136635142, 0, 0), x_dir=(0, 0.5877852522924732, 0.8090169943749473), z_dir=(1, 0, 0)), DAIRESEL_KAPLAMA1_COPY_6_DRAFT)


with BuildPart() as part_7:
    add(part_6.part)

    # Dairesel Kaplama1 copy 6: cut by dairesel_kaplama1_copy_6_tool
    add(dairesel_kaplama1_copy_6_tool.part, mode=Mode.SUBTRACT)


with BuildPart() as dairesel_kaplama1_copy_7_tool:
    # Dairesel Kaplama1 copy 7 sketch → Dairesel Kaplama1 copy 7 (with draft: the straight prism first)
    with BuildSketch(Plane(origin=(-0.136635142, 0, 0), x_dir=(0, -0.587785252292473, 0.8090169943749476), z_dir=(1, 0, 0))):
        with Locations((0, 30)):
            Circle(DAIRESEL_KAPLAMA1_COPY_7_SKETCH_R)
    extrude(amount=DAIRESEL_KAPLAMA1_COPY_7_DEPTH)
    # Dairesel Kaplama1 copy 7: the draft: its side faces are tilted about the plane it starts from
    dairesel_kaplama1_copy_7_sides = [dairesel_kaplama1_copy_7_tool.faces().sort_by_distance(p)[0] for p in [
        (5.863364858, -21.33158357, -21.678642541),
    ]]
    draft(dairesel_kaplama1_copy_7_sides, Plane(origin=(-0.136635142, 0, 0), x_dir=(0, -0.587785252292473, 0.8090169943749476), z_dir=(1, 0, 0)), DAIRESEL_KAPLAMA1_COPY_7_DRAFT)


with BuildPart() as part_8:
    add(part_7.part)

    # Dairesel Kaplama1 copy 7: cut by dairesel_kaplama1_copy_7_tool
    add(dairesel_kaplama1_copy_7_tool.part, mode=Mode.SUBTRACT)


with BuildPart() as dairesel_kaplama1_copy_8_tool:
    # Dairesel Kaplama1 copy 8 sketch → Dairesel Kaplama1 copy 8 (with draft: the straight prism first)
    with BuildSketch(Plane(origin=(-0.136635142, 0, 0), x_dir=(0, -0.9510565162951536, -0.30901699437494723), z_dir=(1, 0, 0))):
        with Locations((0, 30)):
            Circle(DAIRESEL_KAPLAMA1_COPY_8_SKETCH_R)
    extrude(amount=DAIRESEL_KAPLAMA1_COPY_8_DEPTH)
    # Dairesel Kaplama1 copy 8: the draft: its side faces are tilted about the plane it starts from
    dairesel_kaplama1_copy_8_sides = [dairesel_kaplama1_copy_8_tool.faces().sort_by_distance(p)[0] for p in [
        (5.863364858, 14.025792413, -26.986610517),
    ]]
    draft(dairesel_kaplama1_copy_8_sides, Plane(origin=(-0.136635142, 0, 0), x_dir=(0, -0.9510565162951536, -0.30901699437494723), z_dir=(1, 0, 0)), DAIRESEL_KAPLAMA1_COPY_8_DRAFT)


with BuildPart() as part_9:
    add(part_8.part)

    # Dairesel Kaplama1 copy 8: cut by dairesel_kaplama1_copy_8_tool
    add(dairesel_kaplama1_copy_8_tool.part, mode=Mode.SUBTRACT)


solid = part_9.part
